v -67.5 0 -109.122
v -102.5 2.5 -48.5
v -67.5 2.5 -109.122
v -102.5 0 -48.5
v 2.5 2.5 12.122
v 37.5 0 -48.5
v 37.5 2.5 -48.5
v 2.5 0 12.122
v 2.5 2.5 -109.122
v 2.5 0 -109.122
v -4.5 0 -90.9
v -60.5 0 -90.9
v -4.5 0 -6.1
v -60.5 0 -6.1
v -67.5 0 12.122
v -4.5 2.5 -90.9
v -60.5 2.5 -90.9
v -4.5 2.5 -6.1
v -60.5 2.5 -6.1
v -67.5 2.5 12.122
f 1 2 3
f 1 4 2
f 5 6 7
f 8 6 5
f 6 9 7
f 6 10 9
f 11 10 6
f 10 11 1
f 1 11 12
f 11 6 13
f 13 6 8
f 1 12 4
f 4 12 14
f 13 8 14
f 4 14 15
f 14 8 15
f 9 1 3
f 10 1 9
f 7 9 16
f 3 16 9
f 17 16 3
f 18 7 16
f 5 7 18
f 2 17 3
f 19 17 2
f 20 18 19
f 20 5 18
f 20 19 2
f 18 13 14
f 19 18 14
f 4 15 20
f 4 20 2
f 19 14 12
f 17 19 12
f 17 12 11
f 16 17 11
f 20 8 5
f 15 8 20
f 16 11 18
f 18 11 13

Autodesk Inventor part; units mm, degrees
ref_plane "YZ Plane" through (0, 0, 0) normal (1, 0, 0) x (0, 1, 0)
ref_plane "XZ Plane" through (0, 0, 0) normal (0, 1, 0) x (-1, 0, 0)
ref_plane "XY Plane" through (0, 0, 0) normal (0, 0, 1) x (1, 0, 0)
sketch "Sketch6" plane through (0, 0, 0) normal (0, 1, 0) x (-1, 0, 0)
  line L0 (4.5, -6.1) -> (60.5, -6.1)
  line L1 (60.5, -6.1) -> (60.5, -90.9)
  line L2 (4.5, -90.9) -> (4.5, -6.1)
  line L3 (65.1201, -97) -> (0, -97)
  line L4 (0, -97) -> (0, 0)
  line L5 (0, 0) -> (65.1201, 0)
  line L6 (65.1201, 0) -> (65.1201, -97)
  line L7 (60.5, -90.9) -> (4.5, -90.9)
  line L8 (102.5, -48.5) -> (-37.5, -48.5)
  line L9 (32.5, -118.5) -> (32.5, 21.5)
  circle A0 centre (32.5, -48.5) radius 70
  line L10 (102.5, -48.5) -> (67.5, -109.1218)
  line L11 (67.5, -109.1218) -> (-2.5, -109.1218)
  line L12 (-2.5, -109.1218) -> (-37.5, -48.5)
  line L13 (-37.5, -48.5) -> (-2.5, 12.1218)
  line L14 (-2.5, 12.1218) -> (67.5, 12.1218)
  line L15 (67.5, 12.1218) -> (102.5, -48.5)
  line L16 (32.5, 12.1218) -> (85, -18.1891)
  line L17 (85, -18.1891) -> (85, -78.8109)
  line L18 (85, -78.8109) -> (32.5, -109.1218)
  line L19 (32.5, -109.1218) -> (-20, -78.8109)
  line L20 (-20, -78.8109) -> (-20, -18.1891)
  line L21 (-20, -18.1891) -> (32.5, 12.1218)
  line L22 (32.5, 12.1218) -> (47.5, 12.1218)
  line L23 (47.5, 12.1218) -> (47.5, 5.6218)
  line L24 (47.5, 5.6218) -> (17.5, 5.6218)
  line L25 (17.5, 5.6218) -> (17.5, 12.1218)
  line L26 (47.5, 5.6218) -> (56.6924, 5.6218) construction
  line L27 (17.5, 8.8718) -> (20, 8.8718)
  line L28 (47.5, 8.8718) -> (45, 8.8718)
  line L29 (45, 8.8718) -> (45, 10.1218)
  line L30 (45, 10.1218) -> (20, 10.1218)
  line L31 (20, 10.1218) -> (20, 7.6218)
  line L32 (20, 7.6218) -> (45, 7.6218)
  line L33 (45, 7.6218) -> (45, 10.1218)
  line L34 (67.5, 12.1218) -> (32.5, -48.5)
  line L35 (32.5, -48.5) -> (67.5, -109.1218)
  line L36 (47.5, 5.6218) -> (56.6924, 5.6218)
  line L37 (17.5, 5.6218) -> (11, 5.6218)
  line L38 (17.5, 12.1218) -> (11, 5.6218)
  line L39 (17.5, 12.1218) -> (26.6924, 12.1218) construction
  line L40 (47.5, 12.1218) -> (54, 5.6218)
  line L41 (85, -18.1891) -> (77.5, -5.1987)
  line L42 (77.5, -5.1987) -> (71.8708, -8.4487)
  line L43 (71.8708, -8.4487) -> (86.8708, -34.4295)
  line L44 (86.8708, -34.4295) -> (92.5, -31.1795)
  line L45 (71.8708, -8.4487) -> (67.2746, -0.4879) construction
  line L46 (89.6854, -32.8045) -> (88.4354, -30.6394)
  line L47 (74.6854, -6.8237) -> (75.9354, -8.9888)
  line L48 (75.9354, -8.9888) -> (77.0179, -8.3638)
  line L49 (77.0179, -8.3638) -> (89.5179, -30.0144)
  line L50 (89.5179, -30.0144) -> (87.3529, -31.2644)
  line L51 (87.3529, -31.2644) -> (74.8529, -9.6138)
  line L52 (74.8529, -9.6138) -> (77.0179, -8.3638)
  line L53 (71.8708, -8.4487) -> (67.2746, -0.4879)
  line L54 (86.8708, -34.4295) -> (90.1208, -40.0587)
  line L55 (92.5, -31.1795) -> (90.1208, -40.0587)
  line L56 (92.5, -31.1795) -> (87.9038, -23.2187) construction
  line L57 (77.5, -5.1987) -> (68.6208, -2.8196)
  line L58 (71.8708, -88.5513) -> (67.2746, -96.5121) construction
  line L59 (74.6854, -90.1763) -> (75.9354, -88.0112)
  line L60 (74.8529, -87.3862) -> (77.0179, -88.6362)
  line L61 (77.5, -91.8013) -> (71.8708, -88.5513)
  line L62 (77.5, -91.8013) -> (68.6208, -94.1804)
  line L63 (71.8708, -88.5513) -> (67.2746, -96.5121)
  line L64 (77.0179, -88.6362) -> (89.5179, -66.9856)
  line L65 (87.3529, -65.7356) -> (74.8529, -87.3862)
  line L66 (71.8708, -88.5513) -> (86.8708, -62.5705)
  line L67 (89.5179, -66.9856) -> (87.3529, -65.7356)
  line L68 (89.6854, -64.1955) -> (88.4354, -66.3606)
  line L69 (86.8708, -62.5705) -> (92.5, -65.8205)
  line L70 (86.8708, -62.5705) -> (90.1208, -56.9413)
  line L71 (92.5, -65.8205) -> (90.1208, -56.9413)
  line L72 (94.9944, -48.5) -> (63.7472, -102.6218)
  line L73 (63.7472, -102.6218) -> (1.2528, -102.6218)
  line L74 (1.2528, -102.6218) -> (-29.9944, -48.5)
  line L75 (-29.9944, -48.5) -> (1.2528, 5.6218)
  line L76 (1.2528, 5.6218) -> (63.7472, 5.6218)
  line L77 (63.7472, 5.6218) -> (94.9944, -48.5)
  line L78 (74.8529, -87.3862) -> (73.1208, -86.3862)
  line L79 (87.3529, -65.7356) -> (85.6208, -64.7356)
  line L80 (87.3529, -31.2644) -> (85.6208, -32.2644)
  line L81 (74.8529, -9.6138) -> (73.1208, -10.6138)
  line L82 (45, 7.6218) -> (45, 5.6218)
  line L83 (20, 7.6218) -> (20, 5.6218)
  line L84 (60.5, -90.9) -> (4.4985, -90.9)
  line L85 (4.4985, -90.9) -> (4.4985, -97)
  line L86 (4.4985, -97) -> (60.5, -97)
  line L87 (60.5, -97) -> (60.5, -90.9)
  line L88 (60.5, -6.1) -> (4.4985, -6.1)
  line L89 (4.4985, -6.1) -> (4.4985, 0)
  line L90 (4.4985, 0) -> (60.5, 0)
  line L91 (60.5, 0) -> (60.5, -6.1)
  line L92 (-29.9944, -48.5) -> (-22.9944, -48.5)
  line L93 (-29.9944, -48.5) -> (-28.2944, -48.5)
  line L94 (-28.2944, -48.5) -> (-22.9944, -48.5)
  circle A1 centre (-26.9944, -48.5) radius 1.5
  line L95 (-29.9944, -48.5) -> (-23.9944, -48.5)
  line L96 (-23.9944, -48.5) -> (-26.9944, -53.6962)
  line L97 (-23.9944, -48.5) -> (-26.9944, -43.3038)
  point P0 (-27.5473, -52.7386)
  point P1 (-28.2775, -45.5261)
  dimension "d44" = 97
  dimension "d77" = 140
  dimension "d87" = 15
  dimension "d88" = 6.5
  dimension "d89" = 30
  dimension "d91" = 2.5
  dimension "d92" = 2.5
  dimension "d95" = 1.25
  dimension "d96" = 25
  dimension "d97" = 2.5
  dimension "d98" = 25
  dimension "d99" = 135
  dimension "d100" = 0
  dimension "d114" = 1.7
  dimension "d117" = 3
  dimension "d121" = 3
  dimension "d123" = 6
extrude "Fronte" add sketch "Sketch6" along normal blind 2.5 contours L89 L21 L5 L9 L0 | L2 L8 L4 L21 L89 | L9 L5 L16 L34 L0 | L2 L85 L19 L4 L8 | L89 L5 L21 | L21 L4 L5 L89 | L34 L16 L91 L0 | L9 L24 L16 L5 | L5 L21 L24 L9 | L7 L9 L3 L19 L85 | L8 L20 L75 L21 L4 | L4 L19 L74 L20 L8 | L21 L75 L76 L37 L24 L5 L4 | L91 L16 L6 L8 L1 | L34 L91 L16 | L16 L5 L34 | L8 L6 L18 L87 L1 | L7 L35 L18 L3 L9 | L7 L87 L18 L35 | L16 L24 L36 L76 L34 L5 | L24 L21 L32 L9 | L9 L32 L16 L24 | L85 L3 L4 L19 | L19 L3 L85 | L4 L3 L19 L73 L74 | L20 L74 L96 L8 | L8 L97 L75 L20 | L75 L20 L21 | L21 L13 L14 L38 L76 L75 | L24 L83 L32 L21 | L91 L5 L6 L16 | L34 L77 L53 L43 L16 L6 L5 | L8 L17 L66 L18 L6 | L6 L16 L43 L17 L8 | L9 L73 L19 L3 | L3 L18 L73 L9 | L35 L3 L18 | L18 L87 L35 | L16 L32 L82 L24 | L32 L21 L30 L9 | L9 L30 L16 L32 | L74 L73 L19 L11 L12 | L19 L20 L74 | L20 L12 L8 L74 | L75 L8 L13 L20 | L32 L31 L30 L21 | L24 L25 L27 L31 L83 | L76 L36 L40 L14 L34 | L34 L15 L57 L53 L77 | L18 L6 L3 L87 | L18 L66 L63 L72 L35 L3 L6 | L17 L43 L54 L77 L8 | L8 L72 L70 L66 L17 | L3 L35 L73 L18 | L73 L18 L9 | L9 L19 L73 | L16 L30 L29 L33 L32 | L82 L33 L28 L23 L24 | L30 L21 L9 | L9 L16 L30 | L96 L74 L8 A1 | L8 A1 L75 L97 | L38 L25 L37 | L30 L31 L27 L25 L14 L21 | L43 L81 L51 L16 | L16 L51 L17 L43 | L66 L17 L65 L18 | L18 L65 L78 L66 | L77 L55 L15 L8 | L8 L10 L71 L72 | L17 L51 L80 L43 | L66 L79 L65 L17 | L73 L35 L11 L18 | L72 L63 L62 L10 L35 | L16 L14 L23 L28 L29 L30 | L23 L40 L36 | A1 L8 | L8 A1 | L51 L52 L48 L49 L16 | L16 L49 L17 L51 | L43 L42 L47 L52 L81 | L15 L16 L49 L48 L47 L42 | L42 L53 L57 | L65 L17 L64 L18 | L18 L64 L60 L65 | L78 L60 L59 L61 L66 | L71 L69 L70 | L54 L44 L55 | L17 L49 L50 L51 | L80 L50 L46 L44 L43 | L65 L67 L64 L17 | L66 L69 L68 L67 L79 | L16 L17 L49 | L10 L17 L64 L67 L68 L69 | L44 L46 L50 L49 L17 L15 | L64 L17 L18 | L18 L10 L61 L59 L60 L64 | L61 L62 L63
properties part number "FrontalinoWood" material "Wood (Walnut)"
